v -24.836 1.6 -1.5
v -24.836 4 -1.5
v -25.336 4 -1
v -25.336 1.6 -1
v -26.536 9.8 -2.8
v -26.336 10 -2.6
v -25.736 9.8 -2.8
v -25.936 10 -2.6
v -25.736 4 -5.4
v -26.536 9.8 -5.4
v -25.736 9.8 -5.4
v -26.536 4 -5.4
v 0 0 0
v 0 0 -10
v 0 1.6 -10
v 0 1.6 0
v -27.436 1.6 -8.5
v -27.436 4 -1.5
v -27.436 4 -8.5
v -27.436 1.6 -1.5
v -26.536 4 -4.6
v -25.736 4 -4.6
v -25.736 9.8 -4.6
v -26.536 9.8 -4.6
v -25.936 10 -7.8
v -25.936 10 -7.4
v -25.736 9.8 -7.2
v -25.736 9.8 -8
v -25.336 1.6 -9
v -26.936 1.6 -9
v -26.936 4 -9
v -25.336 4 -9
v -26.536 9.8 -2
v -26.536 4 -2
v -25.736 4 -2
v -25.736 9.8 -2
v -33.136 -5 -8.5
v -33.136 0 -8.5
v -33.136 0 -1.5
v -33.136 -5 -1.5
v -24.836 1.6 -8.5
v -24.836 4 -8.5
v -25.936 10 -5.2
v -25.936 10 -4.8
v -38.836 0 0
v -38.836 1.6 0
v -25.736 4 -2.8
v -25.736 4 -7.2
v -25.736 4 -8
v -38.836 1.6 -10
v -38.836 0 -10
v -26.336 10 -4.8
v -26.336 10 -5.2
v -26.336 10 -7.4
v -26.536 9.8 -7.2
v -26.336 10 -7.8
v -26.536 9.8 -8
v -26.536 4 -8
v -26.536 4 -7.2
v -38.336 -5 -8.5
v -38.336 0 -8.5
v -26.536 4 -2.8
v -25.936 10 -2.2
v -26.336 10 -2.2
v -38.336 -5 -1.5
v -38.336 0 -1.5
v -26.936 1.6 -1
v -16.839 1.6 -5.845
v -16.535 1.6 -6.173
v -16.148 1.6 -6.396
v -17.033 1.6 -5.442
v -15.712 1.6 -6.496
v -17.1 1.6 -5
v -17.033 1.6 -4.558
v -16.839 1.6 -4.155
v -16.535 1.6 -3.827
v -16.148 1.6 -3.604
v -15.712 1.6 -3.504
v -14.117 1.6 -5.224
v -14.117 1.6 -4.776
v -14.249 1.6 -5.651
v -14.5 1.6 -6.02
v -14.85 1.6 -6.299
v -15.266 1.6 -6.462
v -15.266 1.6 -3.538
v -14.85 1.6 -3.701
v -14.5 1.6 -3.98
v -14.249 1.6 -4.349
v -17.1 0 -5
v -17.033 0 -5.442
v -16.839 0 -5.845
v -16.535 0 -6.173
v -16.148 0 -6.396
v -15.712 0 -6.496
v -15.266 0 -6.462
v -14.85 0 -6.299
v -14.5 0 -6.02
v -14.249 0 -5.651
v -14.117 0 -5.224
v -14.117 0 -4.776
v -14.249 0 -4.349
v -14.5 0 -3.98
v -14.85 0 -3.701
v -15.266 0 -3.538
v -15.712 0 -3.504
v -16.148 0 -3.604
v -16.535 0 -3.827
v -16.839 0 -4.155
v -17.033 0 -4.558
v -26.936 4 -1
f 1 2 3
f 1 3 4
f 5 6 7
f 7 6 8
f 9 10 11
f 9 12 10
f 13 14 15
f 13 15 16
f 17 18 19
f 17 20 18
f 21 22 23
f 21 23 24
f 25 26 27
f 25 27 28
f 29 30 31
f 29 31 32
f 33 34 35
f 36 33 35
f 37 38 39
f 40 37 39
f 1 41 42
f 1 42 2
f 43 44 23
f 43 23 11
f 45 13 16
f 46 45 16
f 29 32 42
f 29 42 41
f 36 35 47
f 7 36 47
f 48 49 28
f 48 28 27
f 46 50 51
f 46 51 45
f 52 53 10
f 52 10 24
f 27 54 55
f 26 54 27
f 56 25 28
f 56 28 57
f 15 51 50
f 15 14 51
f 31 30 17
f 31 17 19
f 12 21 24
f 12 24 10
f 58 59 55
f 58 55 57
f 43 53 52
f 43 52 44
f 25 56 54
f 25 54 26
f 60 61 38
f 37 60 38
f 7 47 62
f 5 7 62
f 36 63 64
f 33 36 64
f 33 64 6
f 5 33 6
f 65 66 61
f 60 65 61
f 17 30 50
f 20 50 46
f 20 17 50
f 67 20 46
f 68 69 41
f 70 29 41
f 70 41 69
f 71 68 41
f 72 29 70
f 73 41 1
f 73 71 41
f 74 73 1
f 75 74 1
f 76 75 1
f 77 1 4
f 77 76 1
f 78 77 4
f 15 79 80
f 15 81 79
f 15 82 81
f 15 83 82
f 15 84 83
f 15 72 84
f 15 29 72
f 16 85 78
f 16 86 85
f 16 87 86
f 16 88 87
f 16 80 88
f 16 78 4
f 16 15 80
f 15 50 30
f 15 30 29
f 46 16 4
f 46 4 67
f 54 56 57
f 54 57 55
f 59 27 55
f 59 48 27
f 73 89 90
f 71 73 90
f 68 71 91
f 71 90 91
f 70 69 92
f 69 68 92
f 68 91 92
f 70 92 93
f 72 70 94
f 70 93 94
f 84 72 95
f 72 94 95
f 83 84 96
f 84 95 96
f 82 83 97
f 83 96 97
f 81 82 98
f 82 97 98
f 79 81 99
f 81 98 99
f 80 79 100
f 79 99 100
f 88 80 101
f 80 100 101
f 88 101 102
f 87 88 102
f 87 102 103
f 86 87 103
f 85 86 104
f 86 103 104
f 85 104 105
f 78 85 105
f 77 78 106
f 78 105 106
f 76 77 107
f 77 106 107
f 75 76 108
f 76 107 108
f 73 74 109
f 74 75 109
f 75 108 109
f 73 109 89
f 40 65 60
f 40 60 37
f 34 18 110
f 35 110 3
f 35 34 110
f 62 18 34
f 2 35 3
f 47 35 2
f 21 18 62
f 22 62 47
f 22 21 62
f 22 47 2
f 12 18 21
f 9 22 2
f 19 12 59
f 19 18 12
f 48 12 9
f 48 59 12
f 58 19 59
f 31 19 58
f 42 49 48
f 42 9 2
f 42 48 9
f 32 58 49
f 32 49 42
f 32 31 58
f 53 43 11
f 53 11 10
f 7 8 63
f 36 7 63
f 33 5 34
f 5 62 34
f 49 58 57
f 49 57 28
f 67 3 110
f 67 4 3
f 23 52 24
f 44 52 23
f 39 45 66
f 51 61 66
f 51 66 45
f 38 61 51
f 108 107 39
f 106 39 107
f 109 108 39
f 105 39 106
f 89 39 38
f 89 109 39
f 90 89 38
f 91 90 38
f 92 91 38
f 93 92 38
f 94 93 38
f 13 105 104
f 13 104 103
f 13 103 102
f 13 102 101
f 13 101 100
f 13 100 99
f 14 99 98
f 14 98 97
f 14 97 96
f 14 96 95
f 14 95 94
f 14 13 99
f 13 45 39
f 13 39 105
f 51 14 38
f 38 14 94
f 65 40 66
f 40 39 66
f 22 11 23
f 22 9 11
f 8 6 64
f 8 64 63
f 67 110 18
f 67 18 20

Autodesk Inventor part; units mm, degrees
ref_plane "YZ Plane" through (0, 0, 0) normal (1, 0, 0) x (0, 1, 0)
ref_plane "XZ Plane" through (0, 0, 0) normal (0, 1, 0) x (-1, 0, 0)
ref_plane "XY Plane" through (0, 0, 0) normal (0, 0, 1) x (1, 0, 0)
sketch "Эскиз2" plane through (0, 0, 0) normal (0, 1, 0) x (-1, 0, 0)
  line L0 (0, 0) -> (38.3359, 0) construction
  line L1 (38.3359, 0) -> (38.3359, -10) construction
  line L2 (38.3359, -10) -> (0, -10) construction
  line L3 (0, -10) -> (0, 0) construction
  line L4 (0, 0) -> (38.3359, 0)
  line L5 (38.3359, 0) -> (38.3359, -10)
  line L6 (38.3359, -10) -> (0, -10)
  line L7 (0, -10) -> (0, 0)
  circle A0 centre (15.6, -5) radius 1.5
  point P0 (0, -5)
  dimension "d1" = 10
  dimension "d11" = 15.6
  dimension "d12" = 3
extrude "Выдавливание1" add sketch "Эскиз2" along normal blind 1.6
sketch "Эскиз3" plane through (0, 1.6, 0) normal (0, 1, 0) x (1, 0, 0)
  line L0 (0, 0) -> (-38.3359, 0) construction
  line L1 (-38.3359, 0) -> (-38.3359, 10) construction
  line L2 (-38.3359, 10) -> (0, 10) construction
  line L3 (0, 10) -> (0, 0) construction
  line L4 (-27.4359, 9) -> (-24.8359, 9)
  line L5 (-24.8359, 9) -> (-24.8359, 1)
  line L6 (-24.8359, 1) -> (-27.4359, 1)
  line L7 (-27.4359, 1) -> (-27.4359, 9)
  point P0 (-27.4359, 5)
  point P1 (-38.3359, 5)
  dimension "d43" = 2.6
  dimension "d50" = 8
  dimension "d51" = 10.9
extrude "Выдавливание2" add sketch "Эскиз3" along normal blind 2.4
chamfer "Фаска1" distance 0.5 angle 45 4 edges at (-24.8359, 2.8, -1) (-27.4359, 2.8, -1) (-24.8359, 2.8, -9) (-27.4359, 2.8, -9)
sketch "Эскиз4" plane through (0, 4, 0) normal (0, 1, 0) x (1, 0, 0)
  line L0 (-26.5359, 8) -> (-25.7359, 8)
  line L1 (-25.7359, 8) -> (-25.7359, 7.2)
  line L2 (-25.7359, 7.2) -> (-26.5359, 7.2)
  line L3 (-26.5359, 7.2) -> (-26.5359, 8)
  line L4 (-26.5359, 5.4) -> (-25.7359, 5.4)
  line L5 (-25.7359, 5.4) -> (-25.7359, 4.6)
  line L6 (-25.7359, 4.6) -> (-26.5359, 4.6)
  line L7 (-26.5359, 4.6) -> (-26.5359, 5.4)
  line L8 (-26.5359, 2) -> (-25.7359, 2)
  line L9 (-25.7359, 2) -> (-25.7359, 2.8)
  line L10 (-25.7359, 2.8) -> (-26.5359, 2.8)
  line L11 (-26.5359, 2.8) -> (-26.5359, 2)
  line L12 (-27.4359, 8.5) -> (-26.9359, 9) projected
  line L13 (-27.4359, 8.5) -> (-27.4359, 1.5) projected
  line L14 (-26.9359, 1) -> (-27.4359, 1.5) projected
  line L15 (-26.9359, 1) -> (-25.3359, 1) projected
  line L16 (-24.8359, 1.5) -> (-25.3359, 1) projected
  line L17 (-24.8359, 1.5) -> (-24.8359, 8.5) projected
  line L18 (-25.3359, 9) -> (-24.8359, 8.5) projected
  line L19 (-25.3359, 9) -> (-26.9359, 9) projected
  line L20 (-27.4359, 5) -> (-24.8359, 5)
  point P0 (0, 0)
  point P1 (-26.5359, 5)
  point P2 (-26.1359, 5.4)
  point P3 (-26.1359, 9)
  dimension "d57" = 0.8
  dimension "d58" = 4.4
extrude "Выдавливание3" add sketch "Эскиз4" along normal blind 6 contours L0 L1 L2 L3 | L4 L5 L20 L7 | L20 L5 L6 L7 | L11 L10 L9 L8
chamfer "Фаска2" distance 0.2 angle 45 12 edges at (-26.1359, 10, -2) (-26.5359, 10, -2.4) (-26.1359, 10, -2.8) (-25.7359, 10, -2.4) (-26.1359, 10, -4.6) (-26.5359, 10, -5) (-26.1359, 10, -5.4) (-25.7359, 10, -5) (-26.1359, 10, -7.2) (-26.5359, 10, -7.6) (-26.1359, 10, -8) (-25.7359, 10, -7.6)
sketch "Эскиз5" plane through (0, 0, 0) normal (0, -1, 0) x (1, 0, 0)
  line L0 (-38.3359, -8.5) -> (-33.1359, -8.5)
  line L1 (-33.1359, -8.5) -> (-33.1359, -1.5)
  line L2 (-33.1359, -1.5) -> (-38.3359, -1.5)
  line L3 (-38.3359, -1.5) -> (-38.3359, -8.5)
  line L4 (-38.3359, 0) -> (-38.3359, -10) projected
  line L5 (0, -10) -> (-38.3359, -10) construction
  line L6 (-38.3359, -10) -> (-38.3359, 0) construction
  line L7 (-38.3359, 0) -> (0, 0) construction
  line L8 (0, 0) -> (0, -10) construction
  point P0 (0, 0)
  point P1 (-38.3359, -5)
  point P2 (-38.3359, -5)
  dimension "d106" = 5.2
  dimension "d109" = 7
sketch "Эскиз6" plane through (-38.3359, 0, -10) normal (-1, 0, 0) x (0, 0, 1)
  line L0 (10, 0) -> (0, 0) projected
  line L1 (10, 0) -> (10, 1.6) projected
  line L2 (0, 1.6) -> (10, 1.6) projected
  line L3 (0, 0) -> (0, 1.6) projected
  point P0 (10, 0)
extrude "Выдавливание4" add sketch "Эскиз6" along normal blind 0.5
extrude "Выдавливание5" add sketch "Эскиз5" along normal blind 5
properties part number "LineSensor"
